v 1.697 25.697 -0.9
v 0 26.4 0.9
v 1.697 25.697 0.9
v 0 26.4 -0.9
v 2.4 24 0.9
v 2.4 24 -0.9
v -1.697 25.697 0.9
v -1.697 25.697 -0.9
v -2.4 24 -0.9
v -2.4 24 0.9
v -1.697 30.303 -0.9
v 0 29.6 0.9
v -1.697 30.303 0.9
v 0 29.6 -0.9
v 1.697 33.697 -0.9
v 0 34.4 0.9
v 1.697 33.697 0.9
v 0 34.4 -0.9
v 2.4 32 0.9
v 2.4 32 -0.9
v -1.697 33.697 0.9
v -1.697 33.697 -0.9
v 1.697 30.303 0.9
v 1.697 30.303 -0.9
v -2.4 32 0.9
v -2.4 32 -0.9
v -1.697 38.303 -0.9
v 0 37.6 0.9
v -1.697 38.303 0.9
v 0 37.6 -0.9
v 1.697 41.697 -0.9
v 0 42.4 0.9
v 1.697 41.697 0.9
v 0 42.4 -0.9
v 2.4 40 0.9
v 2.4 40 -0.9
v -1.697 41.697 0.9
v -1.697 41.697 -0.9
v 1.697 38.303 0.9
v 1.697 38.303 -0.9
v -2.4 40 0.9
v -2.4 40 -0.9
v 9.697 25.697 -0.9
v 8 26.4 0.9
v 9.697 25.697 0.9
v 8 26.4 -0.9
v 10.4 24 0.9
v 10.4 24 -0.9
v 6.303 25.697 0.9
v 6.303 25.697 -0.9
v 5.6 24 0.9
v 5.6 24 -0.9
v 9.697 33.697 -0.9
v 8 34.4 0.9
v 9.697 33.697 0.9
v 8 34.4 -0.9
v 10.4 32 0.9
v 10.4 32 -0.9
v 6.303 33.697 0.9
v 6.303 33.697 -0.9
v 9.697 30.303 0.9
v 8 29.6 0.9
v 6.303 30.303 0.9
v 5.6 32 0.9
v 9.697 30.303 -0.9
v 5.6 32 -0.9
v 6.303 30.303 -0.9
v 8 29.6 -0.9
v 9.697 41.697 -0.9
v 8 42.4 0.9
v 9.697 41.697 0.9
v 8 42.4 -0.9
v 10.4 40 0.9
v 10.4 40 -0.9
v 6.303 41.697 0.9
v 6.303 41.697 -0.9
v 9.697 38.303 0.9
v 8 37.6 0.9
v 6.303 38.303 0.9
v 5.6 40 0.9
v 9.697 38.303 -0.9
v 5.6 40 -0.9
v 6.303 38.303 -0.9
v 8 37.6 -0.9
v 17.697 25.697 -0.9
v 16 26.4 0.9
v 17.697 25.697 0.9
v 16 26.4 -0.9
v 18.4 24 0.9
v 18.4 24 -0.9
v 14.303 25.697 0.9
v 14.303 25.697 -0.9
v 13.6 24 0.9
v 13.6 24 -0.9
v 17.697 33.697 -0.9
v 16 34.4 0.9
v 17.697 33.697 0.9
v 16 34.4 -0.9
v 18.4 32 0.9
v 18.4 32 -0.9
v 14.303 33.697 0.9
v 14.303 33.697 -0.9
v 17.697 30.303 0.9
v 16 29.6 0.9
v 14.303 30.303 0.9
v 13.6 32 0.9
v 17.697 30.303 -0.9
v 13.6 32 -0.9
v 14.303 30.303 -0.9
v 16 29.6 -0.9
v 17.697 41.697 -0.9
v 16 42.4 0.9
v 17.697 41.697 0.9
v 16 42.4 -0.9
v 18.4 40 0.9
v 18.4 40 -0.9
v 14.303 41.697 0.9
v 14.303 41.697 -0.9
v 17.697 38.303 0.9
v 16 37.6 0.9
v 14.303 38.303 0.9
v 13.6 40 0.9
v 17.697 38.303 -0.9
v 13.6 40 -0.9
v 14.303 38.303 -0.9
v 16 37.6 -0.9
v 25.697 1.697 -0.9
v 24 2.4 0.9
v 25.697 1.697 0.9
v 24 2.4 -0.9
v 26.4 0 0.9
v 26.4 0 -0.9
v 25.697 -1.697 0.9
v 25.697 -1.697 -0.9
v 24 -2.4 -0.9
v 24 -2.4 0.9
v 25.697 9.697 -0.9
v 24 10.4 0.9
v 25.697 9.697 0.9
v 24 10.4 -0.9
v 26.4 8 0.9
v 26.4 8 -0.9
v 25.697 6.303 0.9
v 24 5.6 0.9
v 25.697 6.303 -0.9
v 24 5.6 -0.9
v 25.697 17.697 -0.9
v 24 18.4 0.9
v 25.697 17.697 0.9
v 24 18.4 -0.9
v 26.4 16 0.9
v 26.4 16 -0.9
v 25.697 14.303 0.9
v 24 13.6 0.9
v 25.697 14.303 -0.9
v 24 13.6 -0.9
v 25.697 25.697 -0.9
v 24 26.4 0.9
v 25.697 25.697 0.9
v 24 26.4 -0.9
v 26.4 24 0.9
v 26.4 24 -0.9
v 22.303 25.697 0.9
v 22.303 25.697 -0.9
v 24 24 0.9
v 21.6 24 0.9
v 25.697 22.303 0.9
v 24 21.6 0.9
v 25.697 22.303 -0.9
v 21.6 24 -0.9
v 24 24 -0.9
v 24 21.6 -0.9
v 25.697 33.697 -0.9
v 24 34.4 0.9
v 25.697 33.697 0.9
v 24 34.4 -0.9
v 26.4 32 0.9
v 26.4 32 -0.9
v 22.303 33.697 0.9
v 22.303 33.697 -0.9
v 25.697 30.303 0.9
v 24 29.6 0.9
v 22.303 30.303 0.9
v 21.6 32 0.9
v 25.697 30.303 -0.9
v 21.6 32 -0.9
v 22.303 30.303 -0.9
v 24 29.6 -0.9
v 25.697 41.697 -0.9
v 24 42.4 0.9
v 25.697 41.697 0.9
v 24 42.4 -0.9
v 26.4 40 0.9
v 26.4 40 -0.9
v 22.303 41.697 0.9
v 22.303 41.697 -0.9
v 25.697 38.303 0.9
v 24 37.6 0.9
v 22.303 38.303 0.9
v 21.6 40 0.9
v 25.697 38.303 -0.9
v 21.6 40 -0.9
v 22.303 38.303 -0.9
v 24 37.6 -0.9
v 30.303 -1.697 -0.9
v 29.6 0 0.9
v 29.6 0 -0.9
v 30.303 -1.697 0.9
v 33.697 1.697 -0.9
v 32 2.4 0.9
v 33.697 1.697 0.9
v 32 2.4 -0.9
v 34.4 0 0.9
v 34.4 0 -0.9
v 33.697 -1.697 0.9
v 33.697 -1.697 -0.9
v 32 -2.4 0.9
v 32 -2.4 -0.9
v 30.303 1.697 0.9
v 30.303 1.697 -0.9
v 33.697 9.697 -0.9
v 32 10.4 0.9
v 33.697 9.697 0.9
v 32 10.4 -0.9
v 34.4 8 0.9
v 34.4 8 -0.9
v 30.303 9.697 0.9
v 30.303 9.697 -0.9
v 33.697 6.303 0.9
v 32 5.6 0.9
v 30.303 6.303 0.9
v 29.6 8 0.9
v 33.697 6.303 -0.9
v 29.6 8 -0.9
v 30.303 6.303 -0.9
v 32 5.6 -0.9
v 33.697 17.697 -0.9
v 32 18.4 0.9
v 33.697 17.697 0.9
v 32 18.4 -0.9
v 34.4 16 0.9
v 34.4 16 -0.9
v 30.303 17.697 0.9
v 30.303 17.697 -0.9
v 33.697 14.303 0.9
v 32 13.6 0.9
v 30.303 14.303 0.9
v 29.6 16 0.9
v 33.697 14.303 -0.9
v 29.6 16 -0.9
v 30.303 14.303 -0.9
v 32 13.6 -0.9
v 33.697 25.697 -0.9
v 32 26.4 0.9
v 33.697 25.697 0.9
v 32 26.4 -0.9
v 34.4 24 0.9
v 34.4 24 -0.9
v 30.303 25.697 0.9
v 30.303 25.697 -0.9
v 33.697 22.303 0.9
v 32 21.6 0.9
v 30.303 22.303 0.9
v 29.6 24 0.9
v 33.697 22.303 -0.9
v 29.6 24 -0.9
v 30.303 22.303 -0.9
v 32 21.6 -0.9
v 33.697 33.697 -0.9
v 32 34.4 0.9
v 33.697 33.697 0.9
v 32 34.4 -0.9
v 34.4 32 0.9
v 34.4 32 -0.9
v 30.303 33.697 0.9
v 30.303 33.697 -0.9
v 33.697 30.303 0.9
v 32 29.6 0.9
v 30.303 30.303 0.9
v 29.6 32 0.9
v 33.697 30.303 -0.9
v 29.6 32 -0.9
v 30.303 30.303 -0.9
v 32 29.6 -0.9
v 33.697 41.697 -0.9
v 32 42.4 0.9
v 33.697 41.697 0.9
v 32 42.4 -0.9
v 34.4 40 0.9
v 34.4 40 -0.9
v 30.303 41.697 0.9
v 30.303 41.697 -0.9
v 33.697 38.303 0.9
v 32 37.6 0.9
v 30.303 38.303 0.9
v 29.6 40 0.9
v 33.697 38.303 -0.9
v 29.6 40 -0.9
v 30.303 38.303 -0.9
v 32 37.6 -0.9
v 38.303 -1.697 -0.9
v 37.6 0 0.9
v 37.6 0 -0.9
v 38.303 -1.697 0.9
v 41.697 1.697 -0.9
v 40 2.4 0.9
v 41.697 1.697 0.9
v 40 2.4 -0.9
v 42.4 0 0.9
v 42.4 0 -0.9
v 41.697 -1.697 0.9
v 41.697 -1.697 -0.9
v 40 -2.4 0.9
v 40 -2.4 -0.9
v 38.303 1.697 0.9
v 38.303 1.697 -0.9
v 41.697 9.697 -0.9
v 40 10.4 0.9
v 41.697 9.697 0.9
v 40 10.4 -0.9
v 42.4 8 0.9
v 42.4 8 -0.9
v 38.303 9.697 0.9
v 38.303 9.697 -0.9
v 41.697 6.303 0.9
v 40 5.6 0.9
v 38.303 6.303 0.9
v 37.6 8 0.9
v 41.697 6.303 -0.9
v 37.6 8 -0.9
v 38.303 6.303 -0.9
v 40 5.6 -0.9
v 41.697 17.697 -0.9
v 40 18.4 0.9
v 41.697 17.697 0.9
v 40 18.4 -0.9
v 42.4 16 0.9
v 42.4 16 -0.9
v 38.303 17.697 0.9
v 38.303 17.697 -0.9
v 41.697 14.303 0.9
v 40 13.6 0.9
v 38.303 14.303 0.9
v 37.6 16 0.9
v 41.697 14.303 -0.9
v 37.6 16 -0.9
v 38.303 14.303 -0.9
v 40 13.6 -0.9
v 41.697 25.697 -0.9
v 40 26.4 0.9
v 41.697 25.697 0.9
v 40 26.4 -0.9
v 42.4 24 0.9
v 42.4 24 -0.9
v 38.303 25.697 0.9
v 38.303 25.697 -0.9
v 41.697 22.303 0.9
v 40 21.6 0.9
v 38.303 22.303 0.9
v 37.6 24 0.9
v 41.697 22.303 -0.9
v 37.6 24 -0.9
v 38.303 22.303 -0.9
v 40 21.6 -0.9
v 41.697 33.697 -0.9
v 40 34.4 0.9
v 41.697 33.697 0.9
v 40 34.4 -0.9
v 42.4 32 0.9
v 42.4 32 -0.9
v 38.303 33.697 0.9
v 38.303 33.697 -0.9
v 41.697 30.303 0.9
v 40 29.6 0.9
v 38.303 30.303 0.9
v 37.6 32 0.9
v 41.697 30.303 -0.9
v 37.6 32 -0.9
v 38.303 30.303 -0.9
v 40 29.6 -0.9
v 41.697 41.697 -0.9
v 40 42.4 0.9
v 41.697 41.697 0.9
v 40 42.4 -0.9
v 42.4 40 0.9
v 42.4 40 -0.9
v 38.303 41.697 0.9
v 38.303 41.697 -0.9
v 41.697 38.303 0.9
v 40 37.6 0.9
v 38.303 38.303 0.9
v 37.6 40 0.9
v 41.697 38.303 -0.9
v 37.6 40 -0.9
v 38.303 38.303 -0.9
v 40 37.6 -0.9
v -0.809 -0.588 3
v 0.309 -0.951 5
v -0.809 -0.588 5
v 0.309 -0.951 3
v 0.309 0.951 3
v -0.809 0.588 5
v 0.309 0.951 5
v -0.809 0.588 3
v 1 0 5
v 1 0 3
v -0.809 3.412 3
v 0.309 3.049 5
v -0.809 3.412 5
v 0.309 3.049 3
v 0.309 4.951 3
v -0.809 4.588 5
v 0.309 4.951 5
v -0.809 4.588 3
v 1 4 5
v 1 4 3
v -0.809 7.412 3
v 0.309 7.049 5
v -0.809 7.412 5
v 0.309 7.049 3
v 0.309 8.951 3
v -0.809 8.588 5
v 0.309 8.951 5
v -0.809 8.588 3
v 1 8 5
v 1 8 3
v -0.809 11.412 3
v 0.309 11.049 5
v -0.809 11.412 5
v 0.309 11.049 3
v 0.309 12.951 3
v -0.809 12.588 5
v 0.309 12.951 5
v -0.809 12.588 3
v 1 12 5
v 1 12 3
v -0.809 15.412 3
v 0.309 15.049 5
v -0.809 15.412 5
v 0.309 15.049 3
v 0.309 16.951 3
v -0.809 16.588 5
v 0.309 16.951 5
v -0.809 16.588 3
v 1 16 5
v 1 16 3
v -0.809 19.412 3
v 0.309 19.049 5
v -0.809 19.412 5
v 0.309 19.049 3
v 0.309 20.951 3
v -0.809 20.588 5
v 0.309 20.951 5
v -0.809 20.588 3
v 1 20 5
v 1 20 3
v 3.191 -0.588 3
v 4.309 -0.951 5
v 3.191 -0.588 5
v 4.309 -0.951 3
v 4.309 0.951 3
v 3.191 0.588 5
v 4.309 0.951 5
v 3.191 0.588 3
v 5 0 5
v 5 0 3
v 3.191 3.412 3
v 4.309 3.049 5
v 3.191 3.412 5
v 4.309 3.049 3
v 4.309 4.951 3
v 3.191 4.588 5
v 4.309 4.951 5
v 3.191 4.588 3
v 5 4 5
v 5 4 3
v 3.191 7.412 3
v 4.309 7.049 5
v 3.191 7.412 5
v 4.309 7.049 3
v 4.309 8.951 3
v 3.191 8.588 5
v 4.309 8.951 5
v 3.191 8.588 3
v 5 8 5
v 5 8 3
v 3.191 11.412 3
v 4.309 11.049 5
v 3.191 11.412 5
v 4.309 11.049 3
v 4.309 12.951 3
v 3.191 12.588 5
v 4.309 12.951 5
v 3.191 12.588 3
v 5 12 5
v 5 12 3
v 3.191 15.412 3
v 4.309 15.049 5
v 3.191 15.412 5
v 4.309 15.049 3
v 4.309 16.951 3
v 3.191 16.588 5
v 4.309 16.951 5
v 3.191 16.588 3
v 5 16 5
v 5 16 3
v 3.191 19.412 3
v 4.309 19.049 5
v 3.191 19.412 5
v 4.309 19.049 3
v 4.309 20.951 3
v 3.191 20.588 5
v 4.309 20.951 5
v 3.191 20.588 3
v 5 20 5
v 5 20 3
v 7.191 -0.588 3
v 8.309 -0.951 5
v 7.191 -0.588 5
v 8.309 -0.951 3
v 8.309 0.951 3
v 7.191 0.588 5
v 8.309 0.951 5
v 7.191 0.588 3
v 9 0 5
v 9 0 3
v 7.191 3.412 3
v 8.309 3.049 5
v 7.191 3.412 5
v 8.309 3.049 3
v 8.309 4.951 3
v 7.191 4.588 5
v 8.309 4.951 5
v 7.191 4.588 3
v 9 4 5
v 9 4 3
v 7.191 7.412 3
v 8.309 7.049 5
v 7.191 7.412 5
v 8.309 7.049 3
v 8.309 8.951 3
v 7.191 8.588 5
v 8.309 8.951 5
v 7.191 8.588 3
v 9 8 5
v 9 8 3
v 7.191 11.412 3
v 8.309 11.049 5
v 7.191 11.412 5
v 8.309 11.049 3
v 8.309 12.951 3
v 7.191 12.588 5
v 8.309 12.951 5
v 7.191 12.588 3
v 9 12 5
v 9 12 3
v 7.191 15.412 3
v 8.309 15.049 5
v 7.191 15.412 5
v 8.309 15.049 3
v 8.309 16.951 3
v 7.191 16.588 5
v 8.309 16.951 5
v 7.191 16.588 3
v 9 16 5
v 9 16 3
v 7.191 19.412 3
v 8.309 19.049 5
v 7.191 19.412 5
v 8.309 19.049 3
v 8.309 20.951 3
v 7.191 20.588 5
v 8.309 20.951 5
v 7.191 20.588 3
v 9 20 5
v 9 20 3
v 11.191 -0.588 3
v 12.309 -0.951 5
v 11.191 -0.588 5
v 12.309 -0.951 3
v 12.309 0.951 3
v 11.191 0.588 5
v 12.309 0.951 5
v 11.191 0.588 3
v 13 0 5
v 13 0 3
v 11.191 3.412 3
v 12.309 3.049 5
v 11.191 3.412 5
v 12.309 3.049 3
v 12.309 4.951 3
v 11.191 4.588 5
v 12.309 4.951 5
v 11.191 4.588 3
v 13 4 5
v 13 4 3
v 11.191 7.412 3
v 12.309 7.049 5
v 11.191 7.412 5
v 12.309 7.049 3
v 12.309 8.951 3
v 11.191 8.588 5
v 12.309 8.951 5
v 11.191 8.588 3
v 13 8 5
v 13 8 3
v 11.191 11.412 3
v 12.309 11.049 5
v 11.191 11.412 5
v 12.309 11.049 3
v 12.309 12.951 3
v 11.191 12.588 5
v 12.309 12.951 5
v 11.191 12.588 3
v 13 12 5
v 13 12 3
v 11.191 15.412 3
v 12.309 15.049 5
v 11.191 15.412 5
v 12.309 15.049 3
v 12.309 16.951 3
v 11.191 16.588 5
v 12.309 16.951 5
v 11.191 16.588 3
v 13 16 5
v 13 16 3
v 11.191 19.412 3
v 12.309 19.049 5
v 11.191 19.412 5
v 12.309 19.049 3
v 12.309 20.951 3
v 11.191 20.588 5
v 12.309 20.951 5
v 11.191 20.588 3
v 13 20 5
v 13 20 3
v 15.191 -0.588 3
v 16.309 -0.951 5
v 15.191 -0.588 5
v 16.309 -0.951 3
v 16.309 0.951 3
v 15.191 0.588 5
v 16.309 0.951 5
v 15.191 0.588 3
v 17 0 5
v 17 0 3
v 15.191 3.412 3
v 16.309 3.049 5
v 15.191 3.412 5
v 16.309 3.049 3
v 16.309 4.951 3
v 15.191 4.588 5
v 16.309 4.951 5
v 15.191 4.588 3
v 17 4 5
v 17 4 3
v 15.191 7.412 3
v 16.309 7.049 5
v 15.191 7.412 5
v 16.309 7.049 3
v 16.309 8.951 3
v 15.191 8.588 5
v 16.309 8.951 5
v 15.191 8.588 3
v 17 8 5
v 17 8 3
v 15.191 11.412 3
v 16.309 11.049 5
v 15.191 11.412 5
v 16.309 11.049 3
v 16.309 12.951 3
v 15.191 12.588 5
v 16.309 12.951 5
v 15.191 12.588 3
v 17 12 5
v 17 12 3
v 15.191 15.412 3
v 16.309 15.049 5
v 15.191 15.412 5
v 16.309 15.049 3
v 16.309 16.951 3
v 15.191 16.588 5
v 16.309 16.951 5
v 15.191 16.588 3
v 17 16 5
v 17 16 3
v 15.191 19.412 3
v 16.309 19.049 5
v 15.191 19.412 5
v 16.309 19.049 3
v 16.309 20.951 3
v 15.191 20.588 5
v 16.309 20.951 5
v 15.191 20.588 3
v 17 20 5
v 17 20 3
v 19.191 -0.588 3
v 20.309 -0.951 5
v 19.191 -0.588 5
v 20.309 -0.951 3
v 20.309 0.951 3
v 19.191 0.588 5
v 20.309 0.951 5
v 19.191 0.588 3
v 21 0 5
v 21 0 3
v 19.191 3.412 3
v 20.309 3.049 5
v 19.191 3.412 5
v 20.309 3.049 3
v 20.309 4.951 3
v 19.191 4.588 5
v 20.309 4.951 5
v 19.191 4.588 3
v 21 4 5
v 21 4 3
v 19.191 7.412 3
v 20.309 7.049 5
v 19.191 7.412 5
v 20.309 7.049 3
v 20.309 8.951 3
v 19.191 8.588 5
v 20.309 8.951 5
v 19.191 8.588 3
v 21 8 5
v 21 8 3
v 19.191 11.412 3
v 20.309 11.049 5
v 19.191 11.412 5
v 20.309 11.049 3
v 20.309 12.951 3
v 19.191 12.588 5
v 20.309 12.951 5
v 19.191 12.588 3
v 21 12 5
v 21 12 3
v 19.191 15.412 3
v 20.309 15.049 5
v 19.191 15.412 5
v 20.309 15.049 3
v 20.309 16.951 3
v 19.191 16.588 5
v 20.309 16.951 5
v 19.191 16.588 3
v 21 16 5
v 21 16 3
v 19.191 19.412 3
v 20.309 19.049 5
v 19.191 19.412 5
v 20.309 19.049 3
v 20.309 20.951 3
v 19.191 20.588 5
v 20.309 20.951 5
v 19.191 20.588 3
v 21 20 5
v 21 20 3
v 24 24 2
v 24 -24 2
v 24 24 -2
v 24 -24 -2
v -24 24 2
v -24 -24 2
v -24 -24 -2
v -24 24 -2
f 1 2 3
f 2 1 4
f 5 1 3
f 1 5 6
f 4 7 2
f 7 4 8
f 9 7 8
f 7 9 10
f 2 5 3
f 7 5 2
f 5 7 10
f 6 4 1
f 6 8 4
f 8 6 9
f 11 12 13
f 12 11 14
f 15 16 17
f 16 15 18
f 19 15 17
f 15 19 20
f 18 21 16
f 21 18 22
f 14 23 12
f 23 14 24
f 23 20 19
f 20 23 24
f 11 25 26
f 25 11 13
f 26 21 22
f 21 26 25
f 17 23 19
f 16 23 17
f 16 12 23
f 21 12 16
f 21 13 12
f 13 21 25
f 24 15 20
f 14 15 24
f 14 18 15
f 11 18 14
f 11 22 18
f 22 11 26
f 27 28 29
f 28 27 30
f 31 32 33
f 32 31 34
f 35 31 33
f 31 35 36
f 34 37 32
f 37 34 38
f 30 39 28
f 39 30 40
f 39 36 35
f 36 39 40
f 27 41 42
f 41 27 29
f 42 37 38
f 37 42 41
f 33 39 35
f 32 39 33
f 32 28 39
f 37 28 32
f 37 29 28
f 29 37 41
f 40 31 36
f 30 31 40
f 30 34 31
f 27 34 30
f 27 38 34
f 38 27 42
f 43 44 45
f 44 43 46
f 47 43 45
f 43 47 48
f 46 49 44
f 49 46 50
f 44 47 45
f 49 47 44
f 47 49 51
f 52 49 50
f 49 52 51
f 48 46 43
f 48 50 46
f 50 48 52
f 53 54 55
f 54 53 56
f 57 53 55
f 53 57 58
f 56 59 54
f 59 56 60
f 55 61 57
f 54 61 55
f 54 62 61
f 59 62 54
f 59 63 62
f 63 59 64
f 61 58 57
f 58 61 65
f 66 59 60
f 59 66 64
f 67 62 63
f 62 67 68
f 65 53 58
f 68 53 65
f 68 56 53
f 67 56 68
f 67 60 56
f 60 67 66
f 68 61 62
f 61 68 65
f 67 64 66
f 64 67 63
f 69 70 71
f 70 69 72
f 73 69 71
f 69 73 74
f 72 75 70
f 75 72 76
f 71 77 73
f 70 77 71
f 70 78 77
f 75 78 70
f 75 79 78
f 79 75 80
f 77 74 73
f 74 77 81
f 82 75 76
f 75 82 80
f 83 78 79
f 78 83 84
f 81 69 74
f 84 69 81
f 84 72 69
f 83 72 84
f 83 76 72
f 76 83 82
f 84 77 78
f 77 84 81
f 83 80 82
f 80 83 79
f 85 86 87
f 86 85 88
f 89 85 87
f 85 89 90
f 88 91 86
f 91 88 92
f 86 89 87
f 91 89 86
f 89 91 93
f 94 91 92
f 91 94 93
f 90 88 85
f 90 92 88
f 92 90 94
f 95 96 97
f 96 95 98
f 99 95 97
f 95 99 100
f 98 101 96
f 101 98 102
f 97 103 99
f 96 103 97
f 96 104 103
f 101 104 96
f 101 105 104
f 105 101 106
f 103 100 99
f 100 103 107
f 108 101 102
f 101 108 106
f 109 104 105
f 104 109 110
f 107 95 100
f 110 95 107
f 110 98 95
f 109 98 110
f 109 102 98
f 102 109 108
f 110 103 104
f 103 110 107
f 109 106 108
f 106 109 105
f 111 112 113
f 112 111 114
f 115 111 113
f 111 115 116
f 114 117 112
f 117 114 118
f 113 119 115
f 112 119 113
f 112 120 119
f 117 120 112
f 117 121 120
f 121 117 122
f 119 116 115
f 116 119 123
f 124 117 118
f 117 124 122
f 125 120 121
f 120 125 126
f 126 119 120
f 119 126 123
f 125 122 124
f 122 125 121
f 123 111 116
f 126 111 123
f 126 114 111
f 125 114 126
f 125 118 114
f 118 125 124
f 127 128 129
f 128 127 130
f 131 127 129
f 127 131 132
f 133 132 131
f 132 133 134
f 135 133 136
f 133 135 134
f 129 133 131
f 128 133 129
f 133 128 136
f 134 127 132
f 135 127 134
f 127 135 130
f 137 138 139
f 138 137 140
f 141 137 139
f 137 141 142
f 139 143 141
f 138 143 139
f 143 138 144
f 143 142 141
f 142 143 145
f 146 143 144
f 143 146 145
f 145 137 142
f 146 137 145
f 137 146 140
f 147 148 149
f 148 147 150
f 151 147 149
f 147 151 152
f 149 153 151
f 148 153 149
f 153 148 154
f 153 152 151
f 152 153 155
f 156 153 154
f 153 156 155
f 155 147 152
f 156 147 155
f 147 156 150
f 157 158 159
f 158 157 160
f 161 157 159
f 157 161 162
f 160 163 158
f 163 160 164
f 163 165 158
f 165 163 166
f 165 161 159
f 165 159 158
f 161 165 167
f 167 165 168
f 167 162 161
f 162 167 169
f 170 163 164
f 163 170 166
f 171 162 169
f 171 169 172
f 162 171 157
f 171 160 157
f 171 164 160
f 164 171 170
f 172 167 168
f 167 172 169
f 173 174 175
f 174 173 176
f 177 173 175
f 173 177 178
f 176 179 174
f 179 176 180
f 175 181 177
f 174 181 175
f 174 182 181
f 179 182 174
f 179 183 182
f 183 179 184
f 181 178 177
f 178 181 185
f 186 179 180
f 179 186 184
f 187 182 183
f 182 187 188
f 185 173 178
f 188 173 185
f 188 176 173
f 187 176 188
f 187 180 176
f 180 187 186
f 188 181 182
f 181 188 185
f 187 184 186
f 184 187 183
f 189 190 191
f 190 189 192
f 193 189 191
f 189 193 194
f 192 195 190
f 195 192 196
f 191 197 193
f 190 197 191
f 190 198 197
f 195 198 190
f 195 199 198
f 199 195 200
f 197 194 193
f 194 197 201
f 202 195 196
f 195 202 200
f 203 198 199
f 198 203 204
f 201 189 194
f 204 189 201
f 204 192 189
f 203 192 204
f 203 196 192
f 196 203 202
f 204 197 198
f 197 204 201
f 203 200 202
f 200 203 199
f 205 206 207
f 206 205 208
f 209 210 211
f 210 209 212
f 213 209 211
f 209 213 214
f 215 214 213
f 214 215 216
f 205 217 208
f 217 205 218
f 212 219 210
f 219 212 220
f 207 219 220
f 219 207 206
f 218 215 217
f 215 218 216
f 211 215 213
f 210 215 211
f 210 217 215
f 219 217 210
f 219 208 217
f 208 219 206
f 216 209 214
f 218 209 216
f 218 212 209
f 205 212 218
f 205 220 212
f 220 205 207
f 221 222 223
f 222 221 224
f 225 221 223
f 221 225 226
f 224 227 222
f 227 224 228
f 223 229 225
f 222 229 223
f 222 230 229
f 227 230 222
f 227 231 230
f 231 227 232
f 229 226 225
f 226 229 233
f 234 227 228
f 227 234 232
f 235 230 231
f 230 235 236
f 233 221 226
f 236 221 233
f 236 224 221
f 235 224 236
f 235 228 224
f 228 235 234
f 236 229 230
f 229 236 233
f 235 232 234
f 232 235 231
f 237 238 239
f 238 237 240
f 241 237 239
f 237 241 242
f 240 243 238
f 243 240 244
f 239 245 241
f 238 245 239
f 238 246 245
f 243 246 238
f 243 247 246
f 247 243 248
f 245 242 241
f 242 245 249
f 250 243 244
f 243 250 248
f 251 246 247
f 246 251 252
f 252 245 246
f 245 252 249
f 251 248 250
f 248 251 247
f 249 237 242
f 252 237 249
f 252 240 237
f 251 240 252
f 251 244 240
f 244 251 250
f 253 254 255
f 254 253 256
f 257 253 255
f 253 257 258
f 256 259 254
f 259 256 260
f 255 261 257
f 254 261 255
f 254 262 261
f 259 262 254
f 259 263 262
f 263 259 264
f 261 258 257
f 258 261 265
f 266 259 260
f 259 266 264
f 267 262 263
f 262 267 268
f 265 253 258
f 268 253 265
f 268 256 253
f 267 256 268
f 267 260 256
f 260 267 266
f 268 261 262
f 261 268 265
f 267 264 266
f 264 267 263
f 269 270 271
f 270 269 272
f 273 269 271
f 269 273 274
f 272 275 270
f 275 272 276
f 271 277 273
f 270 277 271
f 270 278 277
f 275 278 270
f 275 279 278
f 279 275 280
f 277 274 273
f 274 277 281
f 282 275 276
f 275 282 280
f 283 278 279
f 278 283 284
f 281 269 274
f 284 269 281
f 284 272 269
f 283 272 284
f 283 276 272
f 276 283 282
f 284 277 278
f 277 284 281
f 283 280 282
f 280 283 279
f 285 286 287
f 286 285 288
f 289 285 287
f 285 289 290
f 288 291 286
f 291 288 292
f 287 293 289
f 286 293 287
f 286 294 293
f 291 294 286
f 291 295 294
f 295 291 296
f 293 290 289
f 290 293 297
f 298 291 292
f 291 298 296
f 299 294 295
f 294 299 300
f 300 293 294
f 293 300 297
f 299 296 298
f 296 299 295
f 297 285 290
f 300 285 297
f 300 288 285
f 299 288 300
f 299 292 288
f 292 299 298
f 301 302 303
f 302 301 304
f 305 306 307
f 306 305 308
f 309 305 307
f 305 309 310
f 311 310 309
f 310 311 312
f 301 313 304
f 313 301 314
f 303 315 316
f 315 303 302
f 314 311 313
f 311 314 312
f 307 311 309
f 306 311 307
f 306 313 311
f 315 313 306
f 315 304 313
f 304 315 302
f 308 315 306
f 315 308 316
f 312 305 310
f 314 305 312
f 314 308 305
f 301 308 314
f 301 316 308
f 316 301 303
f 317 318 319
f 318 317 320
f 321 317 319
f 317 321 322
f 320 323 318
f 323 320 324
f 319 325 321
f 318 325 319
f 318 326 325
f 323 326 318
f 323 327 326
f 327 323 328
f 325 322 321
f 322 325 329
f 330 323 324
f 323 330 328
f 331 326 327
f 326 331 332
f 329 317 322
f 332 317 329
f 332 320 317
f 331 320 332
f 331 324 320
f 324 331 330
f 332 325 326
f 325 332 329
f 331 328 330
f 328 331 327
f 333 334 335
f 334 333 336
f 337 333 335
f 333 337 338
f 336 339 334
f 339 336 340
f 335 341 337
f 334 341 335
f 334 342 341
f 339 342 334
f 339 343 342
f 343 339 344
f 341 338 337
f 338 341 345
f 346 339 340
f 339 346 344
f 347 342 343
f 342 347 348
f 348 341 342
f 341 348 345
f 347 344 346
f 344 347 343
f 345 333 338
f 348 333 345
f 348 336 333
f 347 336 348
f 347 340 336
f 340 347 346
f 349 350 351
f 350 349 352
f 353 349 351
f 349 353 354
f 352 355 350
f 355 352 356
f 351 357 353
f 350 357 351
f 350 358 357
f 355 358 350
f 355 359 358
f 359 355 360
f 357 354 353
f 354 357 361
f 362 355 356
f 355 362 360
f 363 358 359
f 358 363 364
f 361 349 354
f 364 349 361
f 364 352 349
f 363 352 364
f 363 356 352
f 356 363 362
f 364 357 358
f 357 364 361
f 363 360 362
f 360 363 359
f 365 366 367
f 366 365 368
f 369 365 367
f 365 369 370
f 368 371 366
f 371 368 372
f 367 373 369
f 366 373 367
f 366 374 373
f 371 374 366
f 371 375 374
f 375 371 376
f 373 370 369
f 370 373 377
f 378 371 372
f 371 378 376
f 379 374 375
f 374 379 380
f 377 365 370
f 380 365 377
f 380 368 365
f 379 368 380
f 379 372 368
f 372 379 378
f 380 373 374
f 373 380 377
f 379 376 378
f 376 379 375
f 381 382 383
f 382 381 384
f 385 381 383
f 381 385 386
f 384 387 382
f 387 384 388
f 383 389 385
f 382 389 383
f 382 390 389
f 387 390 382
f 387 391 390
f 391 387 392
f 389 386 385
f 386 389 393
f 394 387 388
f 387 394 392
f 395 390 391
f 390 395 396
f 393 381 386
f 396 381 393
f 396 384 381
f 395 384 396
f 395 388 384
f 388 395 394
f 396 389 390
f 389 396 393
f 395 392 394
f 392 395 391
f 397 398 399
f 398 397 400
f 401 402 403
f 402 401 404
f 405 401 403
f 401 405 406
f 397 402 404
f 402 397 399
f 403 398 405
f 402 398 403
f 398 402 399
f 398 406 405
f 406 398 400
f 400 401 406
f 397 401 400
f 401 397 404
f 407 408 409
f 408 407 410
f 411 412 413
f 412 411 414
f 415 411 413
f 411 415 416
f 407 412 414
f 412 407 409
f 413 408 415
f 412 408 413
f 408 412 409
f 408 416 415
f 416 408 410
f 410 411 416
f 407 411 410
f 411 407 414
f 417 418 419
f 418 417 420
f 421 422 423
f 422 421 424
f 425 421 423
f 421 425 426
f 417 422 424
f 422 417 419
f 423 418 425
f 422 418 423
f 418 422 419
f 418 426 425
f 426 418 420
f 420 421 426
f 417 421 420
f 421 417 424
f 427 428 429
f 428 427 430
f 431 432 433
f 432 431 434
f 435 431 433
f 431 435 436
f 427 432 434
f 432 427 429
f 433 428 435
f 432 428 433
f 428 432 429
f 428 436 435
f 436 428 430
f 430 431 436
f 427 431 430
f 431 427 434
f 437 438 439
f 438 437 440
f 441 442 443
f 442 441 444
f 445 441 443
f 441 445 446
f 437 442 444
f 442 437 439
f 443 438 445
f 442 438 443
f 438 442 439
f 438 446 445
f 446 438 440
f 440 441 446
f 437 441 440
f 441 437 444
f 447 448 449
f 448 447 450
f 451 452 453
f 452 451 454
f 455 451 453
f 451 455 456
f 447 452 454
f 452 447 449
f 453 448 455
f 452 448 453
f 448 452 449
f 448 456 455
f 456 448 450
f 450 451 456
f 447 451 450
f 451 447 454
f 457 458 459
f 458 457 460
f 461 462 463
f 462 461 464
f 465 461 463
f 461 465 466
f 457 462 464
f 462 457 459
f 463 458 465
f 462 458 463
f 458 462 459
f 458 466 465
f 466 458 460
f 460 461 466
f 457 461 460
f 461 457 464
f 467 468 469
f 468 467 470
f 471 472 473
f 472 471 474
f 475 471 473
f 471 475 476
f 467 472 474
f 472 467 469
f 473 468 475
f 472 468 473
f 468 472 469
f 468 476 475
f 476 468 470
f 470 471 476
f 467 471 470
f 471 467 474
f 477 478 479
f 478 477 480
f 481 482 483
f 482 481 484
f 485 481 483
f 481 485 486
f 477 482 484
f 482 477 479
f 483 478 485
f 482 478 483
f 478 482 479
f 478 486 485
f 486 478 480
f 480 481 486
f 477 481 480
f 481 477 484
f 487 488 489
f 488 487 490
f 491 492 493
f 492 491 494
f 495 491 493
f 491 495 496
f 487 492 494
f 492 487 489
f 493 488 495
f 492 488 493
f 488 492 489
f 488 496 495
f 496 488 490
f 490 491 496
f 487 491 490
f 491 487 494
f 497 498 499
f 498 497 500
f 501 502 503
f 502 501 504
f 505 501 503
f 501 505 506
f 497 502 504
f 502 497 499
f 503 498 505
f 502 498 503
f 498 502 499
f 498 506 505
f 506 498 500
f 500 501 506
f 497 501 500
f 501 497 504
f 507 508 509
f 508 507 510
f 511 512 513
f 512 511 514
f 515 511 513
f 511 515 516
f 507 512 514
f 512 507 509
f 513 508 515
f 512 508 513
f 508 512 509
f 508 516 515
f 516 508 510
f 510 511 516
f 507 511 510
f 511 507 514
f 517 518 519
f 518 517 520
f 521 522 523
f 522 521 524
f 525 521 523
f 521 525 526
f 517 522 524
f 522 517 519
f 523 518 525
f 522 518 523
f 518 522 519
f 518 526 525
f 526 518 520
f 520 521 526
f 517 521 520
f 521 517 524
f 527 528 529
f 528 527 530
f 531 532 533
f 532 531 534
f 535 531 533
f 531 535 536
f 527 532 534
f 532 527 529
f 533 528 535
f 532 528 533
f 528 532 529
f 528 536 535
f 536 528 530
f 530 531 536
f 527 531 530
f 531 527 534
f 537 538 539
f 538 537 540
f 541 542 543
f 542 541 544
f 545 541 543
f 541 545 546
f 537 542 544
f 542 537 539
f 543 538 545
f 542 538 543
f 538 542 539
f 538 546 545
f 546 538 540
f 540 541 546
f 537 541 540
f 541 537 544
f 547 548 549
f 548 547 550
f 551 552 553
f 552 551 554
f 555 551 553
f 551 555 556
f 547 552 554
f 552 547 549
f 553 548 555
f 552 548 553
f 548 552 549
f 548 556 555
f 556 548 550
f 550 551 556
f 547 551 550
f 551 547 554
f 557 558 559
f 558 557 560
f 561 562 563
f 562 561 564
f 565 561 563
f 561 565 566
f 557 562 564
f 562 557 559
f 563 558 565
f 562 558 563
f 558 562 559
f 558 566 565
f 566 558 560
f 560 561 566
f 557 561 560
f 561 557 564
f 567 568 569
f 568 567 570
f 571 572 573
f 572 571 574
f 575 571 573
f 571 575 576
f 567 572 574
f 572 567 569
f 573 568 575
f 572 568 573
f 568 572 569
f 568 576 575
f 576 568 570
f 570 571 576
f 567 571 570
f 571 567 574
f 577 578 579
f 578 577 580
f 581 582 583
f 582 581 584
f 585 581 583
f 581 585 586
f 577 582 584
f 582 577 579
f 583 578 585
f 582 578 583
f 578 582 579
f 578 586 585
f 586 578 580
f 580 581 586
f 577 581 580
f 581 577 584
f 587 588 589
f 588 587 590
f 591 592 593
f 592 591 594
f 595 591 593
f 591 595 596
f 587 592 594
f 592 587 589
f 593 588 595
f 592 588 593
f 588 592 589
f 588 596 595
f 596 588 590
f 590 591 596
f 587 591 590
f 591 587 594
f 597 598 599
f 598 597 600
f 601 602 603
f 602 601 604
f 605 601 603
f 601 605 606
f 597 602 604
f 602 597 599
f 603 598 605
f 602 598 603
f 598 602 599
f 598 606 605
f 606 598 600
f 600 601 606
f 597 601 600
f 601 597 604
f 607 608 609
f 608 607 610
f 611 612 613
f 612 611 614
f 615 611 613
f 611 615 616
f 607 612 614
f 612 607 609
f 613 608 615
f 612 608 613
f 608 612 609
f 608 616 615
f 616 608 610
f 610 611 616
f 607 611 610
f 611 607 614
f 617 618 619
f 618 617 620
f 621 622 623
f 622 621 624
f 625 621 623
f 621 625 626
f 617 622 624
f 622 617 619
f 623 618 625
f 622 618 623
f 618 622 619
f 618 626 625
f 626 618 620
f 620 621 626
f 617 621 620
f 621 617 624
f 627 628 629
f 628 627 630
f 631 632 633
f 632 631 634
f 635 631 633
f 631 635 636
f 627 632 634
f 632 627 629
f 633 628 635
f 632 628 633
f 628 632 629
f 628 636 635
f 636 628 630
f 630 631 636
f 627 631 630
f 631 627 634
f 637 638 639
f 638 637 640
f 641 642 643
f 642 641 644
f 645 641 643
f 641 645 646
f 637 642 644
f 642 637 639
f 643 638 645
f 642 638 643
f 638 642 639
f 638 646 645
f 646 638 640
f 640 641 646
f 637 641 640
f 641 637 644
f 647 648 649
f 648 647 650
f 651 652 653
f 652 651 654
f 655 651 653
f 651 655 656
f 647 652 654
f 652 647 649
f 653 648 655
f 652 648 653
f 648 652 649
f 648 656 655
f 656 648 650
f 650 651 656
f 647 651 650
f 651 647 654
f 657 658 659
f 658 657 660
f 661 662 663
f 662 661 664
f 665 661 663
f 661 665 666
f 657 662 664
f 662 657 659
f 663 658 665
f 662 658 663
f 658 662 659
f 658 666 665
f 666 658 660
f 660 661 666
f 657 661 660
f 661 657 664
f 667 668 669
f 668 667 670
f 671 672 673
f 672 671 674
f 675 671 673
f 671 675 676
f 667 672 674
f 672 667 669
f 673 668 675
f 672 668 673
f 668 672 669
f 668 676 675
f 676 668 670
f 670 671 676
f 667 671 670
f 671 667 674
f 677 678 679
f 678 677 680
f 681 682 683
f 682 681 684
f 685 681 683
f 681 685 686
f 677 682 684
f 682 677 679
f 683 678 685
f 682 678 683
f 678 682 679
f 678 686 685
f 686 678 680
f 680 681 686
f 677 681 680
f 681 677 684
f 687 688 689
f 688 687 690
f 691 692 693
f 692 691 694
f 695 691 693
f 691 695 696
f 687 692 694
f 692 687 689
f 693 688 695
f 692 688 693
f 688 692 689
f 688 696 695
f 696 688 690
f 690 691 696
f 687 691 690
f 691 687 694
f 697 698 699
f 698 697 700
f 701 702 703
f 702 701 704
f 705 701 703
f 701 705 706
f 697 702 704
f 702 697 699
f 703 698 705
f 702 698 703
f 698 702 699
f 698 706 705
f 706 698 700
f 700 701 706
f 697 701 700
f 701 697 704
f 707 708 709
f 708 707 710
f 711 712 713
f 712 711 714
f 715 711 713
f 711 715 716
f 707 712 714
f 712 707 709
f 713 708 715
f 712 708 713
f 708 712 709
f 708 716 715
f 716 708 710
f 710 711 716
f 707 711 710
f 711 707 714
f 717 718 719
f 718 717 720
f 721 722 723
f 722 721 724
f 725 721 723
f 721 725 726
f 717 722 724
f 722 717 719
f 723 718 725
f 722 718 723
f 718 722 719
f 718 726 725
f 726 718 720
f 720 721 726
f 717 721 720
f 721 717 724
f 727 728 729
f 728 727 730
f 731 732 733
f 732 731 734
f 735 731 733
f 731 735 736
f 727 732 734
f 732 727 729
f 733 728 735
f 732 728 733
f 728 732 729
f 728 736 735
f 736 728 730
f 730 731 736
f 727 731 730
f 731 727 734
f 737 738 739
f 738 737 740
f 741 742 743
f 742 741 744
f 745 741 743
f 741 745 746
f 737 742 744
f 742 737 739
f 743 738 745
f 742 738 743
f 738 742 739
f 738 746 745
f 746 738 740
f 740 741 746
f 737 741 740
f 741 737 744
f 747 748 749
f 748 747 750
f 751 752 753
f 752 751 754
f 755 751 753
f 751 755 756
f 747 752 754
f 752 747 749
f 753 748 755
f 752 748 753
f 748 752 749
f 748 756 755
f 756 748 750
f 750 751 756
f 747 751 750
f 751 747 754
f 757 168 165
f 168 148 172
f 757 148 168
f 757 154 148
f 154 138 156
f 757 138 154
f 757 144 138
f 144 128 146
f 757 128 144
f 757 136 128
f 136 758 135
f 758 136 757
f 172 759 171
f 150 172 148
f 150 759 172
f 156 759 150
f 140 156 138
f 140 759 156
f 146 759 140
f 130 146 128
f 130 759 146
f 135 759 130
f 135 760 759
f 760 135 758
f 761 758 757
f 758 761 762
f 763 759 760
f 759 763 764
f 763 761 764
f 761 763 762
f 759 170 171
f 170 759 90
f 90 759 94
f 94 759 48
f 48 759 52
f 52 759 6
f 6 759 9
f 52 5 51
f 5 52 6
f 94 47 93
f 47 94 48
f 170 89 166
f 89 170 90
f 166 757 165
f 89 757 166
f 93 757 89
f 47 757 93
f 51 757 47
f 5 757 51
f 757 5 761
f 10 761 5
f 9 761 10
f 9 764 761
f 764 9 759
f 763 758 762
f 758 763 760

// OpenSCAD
// Parameters
lego_stud_spacing = 8; // LEGO stud spacing in mm
nano_peg_spacing = 4; // Nano block peg spacing in mm
adapter_width = 6; // Width in LEGO studs
adapter_length = 6; // Length in LEGO studs
peg_diameter = 2; // Diameter for nano block pegs
peg_height = 2; // Height of the nano block pegs

// Bottom: LEGO studs
module lego_studs() {
    for (x = [0 : lego_stud_spacing : (adapter_width - 1) * lego_stud_spacing])
        for (y = [0 : lego_stud_spacing : (adapter_length - 1) * lego_stud_spacing])
            translate([x, y, 0])
                cylinder(h = 1.8, d = 4.8, center = true); // LEGO stud height and diameter
}

// Top: Nano Block pegs
module nano_pegs() {
    for (x = [0 : nano_peg_spacing : (adapter_width - 1) * nano_peg_spacing])
        for (y = [0 : nano_peg_spacing : (adapter_length - 1) * nano_peg_spacing])
            translate([x, y, lego_stud_spacing / 2]) // Adjust for LEGO height
                cylinder(h = peg_height, d = peg_diameter, center = true);
}

// Base adapter
module adapter_base() {
    cube([adapter_width * lego_stud_spacing, adapter_length * lego_stud_spacing, lego_stud_spacing / 2], center = true);
}

// Assemble the adapter
adapter_base();
lego_studs();
nano_pegs();
